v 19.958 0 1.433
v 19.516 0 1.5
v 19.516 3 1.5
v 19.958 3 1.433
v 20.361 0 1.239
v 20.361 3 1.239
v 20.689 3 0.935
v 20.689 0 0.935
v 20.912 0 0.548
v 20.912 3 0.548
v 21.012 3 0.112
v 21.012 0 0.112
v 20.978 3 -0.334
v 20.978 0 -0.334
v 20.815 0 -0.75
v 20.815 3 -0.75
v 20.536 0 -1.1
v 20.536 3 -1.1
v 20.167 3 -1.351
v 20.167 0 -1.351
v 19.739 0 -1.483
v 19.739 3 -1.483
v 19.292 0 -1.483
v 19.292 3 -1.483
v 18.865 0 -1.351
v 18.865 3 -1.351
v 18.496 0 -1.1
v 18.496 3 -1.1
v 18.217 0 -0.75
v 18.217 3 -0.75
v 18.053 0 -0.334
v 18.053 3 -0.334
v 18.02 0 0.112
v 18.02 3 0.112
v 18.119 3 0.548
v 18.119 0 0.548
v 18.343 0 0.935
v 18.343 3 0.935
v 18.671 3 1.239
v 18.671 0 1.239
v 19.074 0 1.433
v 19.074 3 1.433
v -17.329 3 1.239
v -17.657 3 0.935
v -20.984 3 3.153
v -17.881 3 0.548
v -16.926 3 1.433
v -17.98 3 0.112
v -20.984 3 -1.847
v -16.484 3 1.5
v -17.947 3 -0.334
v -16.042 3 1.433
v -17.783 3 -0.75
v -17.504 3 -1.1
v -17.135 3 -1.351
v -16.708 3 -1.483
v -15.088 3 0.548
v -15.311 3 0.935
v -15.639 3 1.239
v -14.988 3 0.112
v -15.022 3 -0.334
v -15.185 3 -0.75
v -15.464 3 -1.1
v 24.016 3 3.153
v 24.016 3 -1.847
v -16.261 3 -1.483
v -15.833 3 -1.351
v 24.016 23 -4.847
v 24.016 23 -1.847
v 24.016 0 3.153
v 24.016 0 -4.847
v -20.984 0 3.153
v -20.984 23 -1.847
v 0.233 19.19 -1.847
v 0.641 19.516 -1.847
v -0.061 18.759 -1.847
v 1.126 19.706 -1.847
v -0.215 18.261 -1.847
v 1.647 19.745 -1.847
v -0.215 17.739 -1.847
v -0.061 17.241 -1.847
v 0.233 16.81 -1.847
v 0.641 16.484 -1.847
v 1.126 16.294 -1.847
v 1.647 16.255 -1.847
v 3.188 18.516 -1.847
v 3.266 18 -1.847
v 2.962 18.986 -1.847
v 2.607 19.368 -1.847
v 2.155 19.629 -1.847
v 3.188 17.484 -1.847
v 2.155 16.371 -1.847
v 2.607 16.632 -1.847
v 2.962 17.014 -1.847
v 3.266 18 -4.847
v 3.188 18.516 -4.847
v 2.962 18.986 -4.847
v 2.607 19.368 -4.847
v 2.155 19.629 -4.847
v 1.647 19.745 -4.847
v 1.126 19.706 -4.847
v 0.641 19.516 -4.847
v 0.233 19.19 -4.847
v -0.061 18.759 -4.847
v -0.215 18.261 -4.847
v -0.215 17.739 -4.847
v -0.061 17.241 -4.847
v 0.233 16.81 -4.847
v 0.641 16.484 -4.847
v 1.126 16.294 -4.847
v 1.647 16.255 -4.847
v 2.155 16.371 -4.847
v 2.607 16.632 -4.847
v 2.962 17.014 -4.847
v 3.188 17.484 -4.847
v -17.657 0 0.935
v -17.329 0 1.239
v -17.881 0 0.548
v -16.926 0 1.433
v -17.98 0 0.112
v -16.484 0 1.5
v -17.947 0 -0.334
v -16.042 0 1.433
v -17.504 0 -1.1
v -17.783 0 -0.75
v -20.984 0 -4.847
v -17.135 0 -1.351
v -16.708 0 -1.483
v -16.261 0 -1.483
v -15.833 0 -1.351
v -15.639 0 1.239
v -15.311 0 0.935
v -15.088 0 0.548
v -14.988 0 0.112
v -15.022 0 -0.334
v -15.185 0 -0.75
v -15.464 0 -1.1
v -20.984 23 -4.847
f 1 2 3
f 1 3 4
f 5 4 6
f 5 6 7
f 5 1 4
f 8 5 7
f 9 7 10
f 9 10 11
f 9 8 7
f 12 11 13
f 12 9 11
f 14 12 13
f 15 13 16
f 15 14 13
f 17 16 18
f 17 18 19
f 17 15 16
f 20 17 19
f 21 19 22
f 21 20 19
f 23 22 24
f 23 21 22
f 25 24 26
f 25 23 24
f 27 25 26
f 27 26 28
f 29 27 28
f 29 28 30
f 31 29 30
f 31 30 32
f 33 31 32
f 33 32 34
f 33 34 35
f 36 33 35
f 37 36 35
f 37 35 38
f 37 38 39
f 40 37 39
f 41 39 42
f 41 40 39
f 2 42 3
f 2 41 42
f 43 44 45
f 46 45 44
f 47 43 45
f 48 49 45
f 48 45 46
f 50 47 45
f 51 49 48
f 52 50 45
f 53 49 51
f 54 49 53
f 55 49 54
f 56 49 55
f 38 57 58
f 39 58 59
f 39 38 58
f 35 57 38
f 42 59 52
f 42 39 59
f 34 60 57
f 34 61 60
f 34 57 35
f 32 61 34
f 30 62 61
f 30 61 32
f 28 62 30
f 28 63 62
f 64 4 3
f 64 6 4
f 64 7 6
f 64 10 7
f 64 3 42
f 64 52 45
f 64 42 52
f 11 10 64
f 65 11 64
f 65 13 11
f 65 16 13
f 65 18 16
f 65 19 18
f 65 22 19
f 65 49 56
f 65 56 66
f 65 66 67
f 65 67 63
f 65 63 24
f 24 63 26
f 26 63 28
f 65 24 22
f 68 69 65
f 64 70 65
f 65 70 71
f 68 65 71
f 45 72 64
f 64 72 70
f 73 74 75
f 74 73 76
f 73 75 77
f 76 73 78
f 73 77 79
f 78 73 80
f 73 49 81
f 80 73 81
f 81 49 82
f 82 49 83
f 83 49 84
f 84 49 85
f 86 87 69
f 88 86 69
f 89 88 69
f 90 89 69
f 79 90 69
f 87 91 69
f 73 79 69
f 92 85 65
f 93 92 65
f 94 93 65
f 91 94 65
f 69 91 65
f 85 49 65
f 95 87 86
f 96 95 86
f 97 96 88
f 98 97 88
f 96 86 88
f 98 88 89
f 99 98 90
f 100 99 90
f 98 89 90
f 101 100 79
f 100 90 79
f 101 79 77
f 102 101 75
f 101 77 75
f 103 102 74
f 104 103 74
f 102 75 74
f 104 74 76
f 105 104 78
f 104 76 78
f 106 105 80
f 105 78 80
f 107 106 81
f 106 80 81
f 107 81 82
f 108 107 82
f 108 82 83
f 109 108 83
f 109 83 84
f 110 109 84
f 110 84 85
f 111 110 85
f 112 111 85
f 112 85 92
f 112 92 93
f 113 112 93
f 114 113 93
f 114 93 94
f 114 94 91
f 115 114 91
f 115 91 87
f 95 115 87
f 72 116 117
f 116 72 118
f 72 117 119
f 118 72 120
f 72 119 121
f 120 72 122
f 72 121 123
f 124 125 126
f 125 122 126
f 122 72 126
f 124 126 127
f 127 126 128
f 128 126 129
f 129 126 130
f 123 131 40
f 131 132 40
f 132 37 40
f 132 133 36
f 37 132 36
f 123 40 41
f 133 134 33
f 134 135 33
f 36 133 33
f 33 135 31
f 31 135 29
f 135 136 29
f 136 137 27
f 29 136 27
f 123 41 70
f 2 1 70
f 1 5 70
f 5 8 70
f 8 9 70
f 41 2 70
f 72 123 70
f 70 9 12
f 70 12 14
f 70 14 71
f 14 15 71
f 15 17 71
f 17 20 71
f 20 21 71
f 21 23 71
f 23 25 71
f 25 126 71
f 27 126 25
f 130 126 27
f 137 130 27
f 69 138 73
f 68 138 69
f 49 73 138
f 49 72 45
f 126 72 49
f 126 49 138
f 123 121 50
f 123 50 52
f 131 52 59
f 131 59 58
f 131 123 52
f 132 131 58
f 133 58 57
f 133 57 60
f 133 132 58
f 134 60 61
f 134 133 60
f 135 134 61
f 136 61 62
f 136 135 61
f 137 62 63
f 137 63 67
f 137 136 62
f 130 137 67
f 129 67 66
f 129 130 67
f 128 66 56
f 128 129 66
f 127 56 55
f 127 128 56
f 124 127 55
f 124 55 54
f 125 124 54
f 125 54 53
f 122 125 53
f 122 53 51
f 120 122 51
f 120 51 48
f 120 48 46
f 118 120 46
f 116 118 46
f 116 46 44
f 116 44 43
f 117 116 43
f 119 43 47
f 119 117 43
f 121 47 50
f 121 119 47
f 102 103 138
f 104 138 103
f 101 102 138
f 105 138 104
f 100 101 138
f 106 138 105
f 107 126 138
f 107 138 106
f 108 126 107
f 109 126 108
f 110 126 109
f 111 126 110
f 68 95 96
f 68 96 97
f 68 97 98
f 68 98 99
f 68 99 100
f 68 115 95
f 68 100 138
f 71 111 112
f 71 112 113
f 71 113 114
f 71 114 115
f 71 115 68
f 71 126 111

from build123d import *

# Parameters (mm, degrees)
ESQUISSE1_W             = 45
ESQUISSE1_H             = 8
ESQUISSE1_R             = 1.5
BOSS_EXTRU_1_DEPTH      = 3
ESQUISSE2_W             = 45
ESQUISSE2_H             = 3
BOSS_EXTRU_2_DEPTH      = 20
ESQUISSE3_R             = 1.75
ENL_V_MAT_EXTRU_1_DEPTH = 20


with BuildPart() as part:
    # Esquisse1 → Boss.-Extru.1 (new body)
    with BuildSketch(Plane(origin=(0, 0, 0), x_dir=(1, 0, 0), z_dir=(0, 1, 0))):
        with Locations((1.515789474, 0.846662995)):
            Rectangle(ESQUISSE1_W, ESQUISSE1_H)
        with Locations(Location((19.515789474, 0, 0), (0, 0, 270))):
            Circle(ESQUISSE1_R, mode=Mode.SUBTRACT)
        with Locations(Location((-16.484210526, 0, 0), (0, 0, 270))):
            Circle(ESQUISSE1_R, mode=Mode.SUBTRACT)
    extrude(amount=BOSS_EXTRU_1_DEPTH)

    # Esquisse2 → Boss.-Extru.2 (add)
    with BuildSketch(Plane(origin=(0, 3, 0), x_dir=(1, 0, 0), z_dir=(0, 1, 0))):
        with Locations((1.515789474, 3.346662995)):
            Rectangle(ESQUISSE2_W, ESQUISSE2_H)
    extrude(amount=BOSS_EXTRU_2_DEPTH)

    # Esquisse3 → Enlèv. mat.-Extru.1 (cut)
    with BuildSketch(Plane.XY.offset(-1.846662995)):
        with Locations((1.515789474, 18)):
            Circle(ESQUISSE3_R)
    extrude(amount=-ENL_V_MAT_EXTRU_1_DEPTH, mode=Mode.SUBTRACT)


solid = part.part
